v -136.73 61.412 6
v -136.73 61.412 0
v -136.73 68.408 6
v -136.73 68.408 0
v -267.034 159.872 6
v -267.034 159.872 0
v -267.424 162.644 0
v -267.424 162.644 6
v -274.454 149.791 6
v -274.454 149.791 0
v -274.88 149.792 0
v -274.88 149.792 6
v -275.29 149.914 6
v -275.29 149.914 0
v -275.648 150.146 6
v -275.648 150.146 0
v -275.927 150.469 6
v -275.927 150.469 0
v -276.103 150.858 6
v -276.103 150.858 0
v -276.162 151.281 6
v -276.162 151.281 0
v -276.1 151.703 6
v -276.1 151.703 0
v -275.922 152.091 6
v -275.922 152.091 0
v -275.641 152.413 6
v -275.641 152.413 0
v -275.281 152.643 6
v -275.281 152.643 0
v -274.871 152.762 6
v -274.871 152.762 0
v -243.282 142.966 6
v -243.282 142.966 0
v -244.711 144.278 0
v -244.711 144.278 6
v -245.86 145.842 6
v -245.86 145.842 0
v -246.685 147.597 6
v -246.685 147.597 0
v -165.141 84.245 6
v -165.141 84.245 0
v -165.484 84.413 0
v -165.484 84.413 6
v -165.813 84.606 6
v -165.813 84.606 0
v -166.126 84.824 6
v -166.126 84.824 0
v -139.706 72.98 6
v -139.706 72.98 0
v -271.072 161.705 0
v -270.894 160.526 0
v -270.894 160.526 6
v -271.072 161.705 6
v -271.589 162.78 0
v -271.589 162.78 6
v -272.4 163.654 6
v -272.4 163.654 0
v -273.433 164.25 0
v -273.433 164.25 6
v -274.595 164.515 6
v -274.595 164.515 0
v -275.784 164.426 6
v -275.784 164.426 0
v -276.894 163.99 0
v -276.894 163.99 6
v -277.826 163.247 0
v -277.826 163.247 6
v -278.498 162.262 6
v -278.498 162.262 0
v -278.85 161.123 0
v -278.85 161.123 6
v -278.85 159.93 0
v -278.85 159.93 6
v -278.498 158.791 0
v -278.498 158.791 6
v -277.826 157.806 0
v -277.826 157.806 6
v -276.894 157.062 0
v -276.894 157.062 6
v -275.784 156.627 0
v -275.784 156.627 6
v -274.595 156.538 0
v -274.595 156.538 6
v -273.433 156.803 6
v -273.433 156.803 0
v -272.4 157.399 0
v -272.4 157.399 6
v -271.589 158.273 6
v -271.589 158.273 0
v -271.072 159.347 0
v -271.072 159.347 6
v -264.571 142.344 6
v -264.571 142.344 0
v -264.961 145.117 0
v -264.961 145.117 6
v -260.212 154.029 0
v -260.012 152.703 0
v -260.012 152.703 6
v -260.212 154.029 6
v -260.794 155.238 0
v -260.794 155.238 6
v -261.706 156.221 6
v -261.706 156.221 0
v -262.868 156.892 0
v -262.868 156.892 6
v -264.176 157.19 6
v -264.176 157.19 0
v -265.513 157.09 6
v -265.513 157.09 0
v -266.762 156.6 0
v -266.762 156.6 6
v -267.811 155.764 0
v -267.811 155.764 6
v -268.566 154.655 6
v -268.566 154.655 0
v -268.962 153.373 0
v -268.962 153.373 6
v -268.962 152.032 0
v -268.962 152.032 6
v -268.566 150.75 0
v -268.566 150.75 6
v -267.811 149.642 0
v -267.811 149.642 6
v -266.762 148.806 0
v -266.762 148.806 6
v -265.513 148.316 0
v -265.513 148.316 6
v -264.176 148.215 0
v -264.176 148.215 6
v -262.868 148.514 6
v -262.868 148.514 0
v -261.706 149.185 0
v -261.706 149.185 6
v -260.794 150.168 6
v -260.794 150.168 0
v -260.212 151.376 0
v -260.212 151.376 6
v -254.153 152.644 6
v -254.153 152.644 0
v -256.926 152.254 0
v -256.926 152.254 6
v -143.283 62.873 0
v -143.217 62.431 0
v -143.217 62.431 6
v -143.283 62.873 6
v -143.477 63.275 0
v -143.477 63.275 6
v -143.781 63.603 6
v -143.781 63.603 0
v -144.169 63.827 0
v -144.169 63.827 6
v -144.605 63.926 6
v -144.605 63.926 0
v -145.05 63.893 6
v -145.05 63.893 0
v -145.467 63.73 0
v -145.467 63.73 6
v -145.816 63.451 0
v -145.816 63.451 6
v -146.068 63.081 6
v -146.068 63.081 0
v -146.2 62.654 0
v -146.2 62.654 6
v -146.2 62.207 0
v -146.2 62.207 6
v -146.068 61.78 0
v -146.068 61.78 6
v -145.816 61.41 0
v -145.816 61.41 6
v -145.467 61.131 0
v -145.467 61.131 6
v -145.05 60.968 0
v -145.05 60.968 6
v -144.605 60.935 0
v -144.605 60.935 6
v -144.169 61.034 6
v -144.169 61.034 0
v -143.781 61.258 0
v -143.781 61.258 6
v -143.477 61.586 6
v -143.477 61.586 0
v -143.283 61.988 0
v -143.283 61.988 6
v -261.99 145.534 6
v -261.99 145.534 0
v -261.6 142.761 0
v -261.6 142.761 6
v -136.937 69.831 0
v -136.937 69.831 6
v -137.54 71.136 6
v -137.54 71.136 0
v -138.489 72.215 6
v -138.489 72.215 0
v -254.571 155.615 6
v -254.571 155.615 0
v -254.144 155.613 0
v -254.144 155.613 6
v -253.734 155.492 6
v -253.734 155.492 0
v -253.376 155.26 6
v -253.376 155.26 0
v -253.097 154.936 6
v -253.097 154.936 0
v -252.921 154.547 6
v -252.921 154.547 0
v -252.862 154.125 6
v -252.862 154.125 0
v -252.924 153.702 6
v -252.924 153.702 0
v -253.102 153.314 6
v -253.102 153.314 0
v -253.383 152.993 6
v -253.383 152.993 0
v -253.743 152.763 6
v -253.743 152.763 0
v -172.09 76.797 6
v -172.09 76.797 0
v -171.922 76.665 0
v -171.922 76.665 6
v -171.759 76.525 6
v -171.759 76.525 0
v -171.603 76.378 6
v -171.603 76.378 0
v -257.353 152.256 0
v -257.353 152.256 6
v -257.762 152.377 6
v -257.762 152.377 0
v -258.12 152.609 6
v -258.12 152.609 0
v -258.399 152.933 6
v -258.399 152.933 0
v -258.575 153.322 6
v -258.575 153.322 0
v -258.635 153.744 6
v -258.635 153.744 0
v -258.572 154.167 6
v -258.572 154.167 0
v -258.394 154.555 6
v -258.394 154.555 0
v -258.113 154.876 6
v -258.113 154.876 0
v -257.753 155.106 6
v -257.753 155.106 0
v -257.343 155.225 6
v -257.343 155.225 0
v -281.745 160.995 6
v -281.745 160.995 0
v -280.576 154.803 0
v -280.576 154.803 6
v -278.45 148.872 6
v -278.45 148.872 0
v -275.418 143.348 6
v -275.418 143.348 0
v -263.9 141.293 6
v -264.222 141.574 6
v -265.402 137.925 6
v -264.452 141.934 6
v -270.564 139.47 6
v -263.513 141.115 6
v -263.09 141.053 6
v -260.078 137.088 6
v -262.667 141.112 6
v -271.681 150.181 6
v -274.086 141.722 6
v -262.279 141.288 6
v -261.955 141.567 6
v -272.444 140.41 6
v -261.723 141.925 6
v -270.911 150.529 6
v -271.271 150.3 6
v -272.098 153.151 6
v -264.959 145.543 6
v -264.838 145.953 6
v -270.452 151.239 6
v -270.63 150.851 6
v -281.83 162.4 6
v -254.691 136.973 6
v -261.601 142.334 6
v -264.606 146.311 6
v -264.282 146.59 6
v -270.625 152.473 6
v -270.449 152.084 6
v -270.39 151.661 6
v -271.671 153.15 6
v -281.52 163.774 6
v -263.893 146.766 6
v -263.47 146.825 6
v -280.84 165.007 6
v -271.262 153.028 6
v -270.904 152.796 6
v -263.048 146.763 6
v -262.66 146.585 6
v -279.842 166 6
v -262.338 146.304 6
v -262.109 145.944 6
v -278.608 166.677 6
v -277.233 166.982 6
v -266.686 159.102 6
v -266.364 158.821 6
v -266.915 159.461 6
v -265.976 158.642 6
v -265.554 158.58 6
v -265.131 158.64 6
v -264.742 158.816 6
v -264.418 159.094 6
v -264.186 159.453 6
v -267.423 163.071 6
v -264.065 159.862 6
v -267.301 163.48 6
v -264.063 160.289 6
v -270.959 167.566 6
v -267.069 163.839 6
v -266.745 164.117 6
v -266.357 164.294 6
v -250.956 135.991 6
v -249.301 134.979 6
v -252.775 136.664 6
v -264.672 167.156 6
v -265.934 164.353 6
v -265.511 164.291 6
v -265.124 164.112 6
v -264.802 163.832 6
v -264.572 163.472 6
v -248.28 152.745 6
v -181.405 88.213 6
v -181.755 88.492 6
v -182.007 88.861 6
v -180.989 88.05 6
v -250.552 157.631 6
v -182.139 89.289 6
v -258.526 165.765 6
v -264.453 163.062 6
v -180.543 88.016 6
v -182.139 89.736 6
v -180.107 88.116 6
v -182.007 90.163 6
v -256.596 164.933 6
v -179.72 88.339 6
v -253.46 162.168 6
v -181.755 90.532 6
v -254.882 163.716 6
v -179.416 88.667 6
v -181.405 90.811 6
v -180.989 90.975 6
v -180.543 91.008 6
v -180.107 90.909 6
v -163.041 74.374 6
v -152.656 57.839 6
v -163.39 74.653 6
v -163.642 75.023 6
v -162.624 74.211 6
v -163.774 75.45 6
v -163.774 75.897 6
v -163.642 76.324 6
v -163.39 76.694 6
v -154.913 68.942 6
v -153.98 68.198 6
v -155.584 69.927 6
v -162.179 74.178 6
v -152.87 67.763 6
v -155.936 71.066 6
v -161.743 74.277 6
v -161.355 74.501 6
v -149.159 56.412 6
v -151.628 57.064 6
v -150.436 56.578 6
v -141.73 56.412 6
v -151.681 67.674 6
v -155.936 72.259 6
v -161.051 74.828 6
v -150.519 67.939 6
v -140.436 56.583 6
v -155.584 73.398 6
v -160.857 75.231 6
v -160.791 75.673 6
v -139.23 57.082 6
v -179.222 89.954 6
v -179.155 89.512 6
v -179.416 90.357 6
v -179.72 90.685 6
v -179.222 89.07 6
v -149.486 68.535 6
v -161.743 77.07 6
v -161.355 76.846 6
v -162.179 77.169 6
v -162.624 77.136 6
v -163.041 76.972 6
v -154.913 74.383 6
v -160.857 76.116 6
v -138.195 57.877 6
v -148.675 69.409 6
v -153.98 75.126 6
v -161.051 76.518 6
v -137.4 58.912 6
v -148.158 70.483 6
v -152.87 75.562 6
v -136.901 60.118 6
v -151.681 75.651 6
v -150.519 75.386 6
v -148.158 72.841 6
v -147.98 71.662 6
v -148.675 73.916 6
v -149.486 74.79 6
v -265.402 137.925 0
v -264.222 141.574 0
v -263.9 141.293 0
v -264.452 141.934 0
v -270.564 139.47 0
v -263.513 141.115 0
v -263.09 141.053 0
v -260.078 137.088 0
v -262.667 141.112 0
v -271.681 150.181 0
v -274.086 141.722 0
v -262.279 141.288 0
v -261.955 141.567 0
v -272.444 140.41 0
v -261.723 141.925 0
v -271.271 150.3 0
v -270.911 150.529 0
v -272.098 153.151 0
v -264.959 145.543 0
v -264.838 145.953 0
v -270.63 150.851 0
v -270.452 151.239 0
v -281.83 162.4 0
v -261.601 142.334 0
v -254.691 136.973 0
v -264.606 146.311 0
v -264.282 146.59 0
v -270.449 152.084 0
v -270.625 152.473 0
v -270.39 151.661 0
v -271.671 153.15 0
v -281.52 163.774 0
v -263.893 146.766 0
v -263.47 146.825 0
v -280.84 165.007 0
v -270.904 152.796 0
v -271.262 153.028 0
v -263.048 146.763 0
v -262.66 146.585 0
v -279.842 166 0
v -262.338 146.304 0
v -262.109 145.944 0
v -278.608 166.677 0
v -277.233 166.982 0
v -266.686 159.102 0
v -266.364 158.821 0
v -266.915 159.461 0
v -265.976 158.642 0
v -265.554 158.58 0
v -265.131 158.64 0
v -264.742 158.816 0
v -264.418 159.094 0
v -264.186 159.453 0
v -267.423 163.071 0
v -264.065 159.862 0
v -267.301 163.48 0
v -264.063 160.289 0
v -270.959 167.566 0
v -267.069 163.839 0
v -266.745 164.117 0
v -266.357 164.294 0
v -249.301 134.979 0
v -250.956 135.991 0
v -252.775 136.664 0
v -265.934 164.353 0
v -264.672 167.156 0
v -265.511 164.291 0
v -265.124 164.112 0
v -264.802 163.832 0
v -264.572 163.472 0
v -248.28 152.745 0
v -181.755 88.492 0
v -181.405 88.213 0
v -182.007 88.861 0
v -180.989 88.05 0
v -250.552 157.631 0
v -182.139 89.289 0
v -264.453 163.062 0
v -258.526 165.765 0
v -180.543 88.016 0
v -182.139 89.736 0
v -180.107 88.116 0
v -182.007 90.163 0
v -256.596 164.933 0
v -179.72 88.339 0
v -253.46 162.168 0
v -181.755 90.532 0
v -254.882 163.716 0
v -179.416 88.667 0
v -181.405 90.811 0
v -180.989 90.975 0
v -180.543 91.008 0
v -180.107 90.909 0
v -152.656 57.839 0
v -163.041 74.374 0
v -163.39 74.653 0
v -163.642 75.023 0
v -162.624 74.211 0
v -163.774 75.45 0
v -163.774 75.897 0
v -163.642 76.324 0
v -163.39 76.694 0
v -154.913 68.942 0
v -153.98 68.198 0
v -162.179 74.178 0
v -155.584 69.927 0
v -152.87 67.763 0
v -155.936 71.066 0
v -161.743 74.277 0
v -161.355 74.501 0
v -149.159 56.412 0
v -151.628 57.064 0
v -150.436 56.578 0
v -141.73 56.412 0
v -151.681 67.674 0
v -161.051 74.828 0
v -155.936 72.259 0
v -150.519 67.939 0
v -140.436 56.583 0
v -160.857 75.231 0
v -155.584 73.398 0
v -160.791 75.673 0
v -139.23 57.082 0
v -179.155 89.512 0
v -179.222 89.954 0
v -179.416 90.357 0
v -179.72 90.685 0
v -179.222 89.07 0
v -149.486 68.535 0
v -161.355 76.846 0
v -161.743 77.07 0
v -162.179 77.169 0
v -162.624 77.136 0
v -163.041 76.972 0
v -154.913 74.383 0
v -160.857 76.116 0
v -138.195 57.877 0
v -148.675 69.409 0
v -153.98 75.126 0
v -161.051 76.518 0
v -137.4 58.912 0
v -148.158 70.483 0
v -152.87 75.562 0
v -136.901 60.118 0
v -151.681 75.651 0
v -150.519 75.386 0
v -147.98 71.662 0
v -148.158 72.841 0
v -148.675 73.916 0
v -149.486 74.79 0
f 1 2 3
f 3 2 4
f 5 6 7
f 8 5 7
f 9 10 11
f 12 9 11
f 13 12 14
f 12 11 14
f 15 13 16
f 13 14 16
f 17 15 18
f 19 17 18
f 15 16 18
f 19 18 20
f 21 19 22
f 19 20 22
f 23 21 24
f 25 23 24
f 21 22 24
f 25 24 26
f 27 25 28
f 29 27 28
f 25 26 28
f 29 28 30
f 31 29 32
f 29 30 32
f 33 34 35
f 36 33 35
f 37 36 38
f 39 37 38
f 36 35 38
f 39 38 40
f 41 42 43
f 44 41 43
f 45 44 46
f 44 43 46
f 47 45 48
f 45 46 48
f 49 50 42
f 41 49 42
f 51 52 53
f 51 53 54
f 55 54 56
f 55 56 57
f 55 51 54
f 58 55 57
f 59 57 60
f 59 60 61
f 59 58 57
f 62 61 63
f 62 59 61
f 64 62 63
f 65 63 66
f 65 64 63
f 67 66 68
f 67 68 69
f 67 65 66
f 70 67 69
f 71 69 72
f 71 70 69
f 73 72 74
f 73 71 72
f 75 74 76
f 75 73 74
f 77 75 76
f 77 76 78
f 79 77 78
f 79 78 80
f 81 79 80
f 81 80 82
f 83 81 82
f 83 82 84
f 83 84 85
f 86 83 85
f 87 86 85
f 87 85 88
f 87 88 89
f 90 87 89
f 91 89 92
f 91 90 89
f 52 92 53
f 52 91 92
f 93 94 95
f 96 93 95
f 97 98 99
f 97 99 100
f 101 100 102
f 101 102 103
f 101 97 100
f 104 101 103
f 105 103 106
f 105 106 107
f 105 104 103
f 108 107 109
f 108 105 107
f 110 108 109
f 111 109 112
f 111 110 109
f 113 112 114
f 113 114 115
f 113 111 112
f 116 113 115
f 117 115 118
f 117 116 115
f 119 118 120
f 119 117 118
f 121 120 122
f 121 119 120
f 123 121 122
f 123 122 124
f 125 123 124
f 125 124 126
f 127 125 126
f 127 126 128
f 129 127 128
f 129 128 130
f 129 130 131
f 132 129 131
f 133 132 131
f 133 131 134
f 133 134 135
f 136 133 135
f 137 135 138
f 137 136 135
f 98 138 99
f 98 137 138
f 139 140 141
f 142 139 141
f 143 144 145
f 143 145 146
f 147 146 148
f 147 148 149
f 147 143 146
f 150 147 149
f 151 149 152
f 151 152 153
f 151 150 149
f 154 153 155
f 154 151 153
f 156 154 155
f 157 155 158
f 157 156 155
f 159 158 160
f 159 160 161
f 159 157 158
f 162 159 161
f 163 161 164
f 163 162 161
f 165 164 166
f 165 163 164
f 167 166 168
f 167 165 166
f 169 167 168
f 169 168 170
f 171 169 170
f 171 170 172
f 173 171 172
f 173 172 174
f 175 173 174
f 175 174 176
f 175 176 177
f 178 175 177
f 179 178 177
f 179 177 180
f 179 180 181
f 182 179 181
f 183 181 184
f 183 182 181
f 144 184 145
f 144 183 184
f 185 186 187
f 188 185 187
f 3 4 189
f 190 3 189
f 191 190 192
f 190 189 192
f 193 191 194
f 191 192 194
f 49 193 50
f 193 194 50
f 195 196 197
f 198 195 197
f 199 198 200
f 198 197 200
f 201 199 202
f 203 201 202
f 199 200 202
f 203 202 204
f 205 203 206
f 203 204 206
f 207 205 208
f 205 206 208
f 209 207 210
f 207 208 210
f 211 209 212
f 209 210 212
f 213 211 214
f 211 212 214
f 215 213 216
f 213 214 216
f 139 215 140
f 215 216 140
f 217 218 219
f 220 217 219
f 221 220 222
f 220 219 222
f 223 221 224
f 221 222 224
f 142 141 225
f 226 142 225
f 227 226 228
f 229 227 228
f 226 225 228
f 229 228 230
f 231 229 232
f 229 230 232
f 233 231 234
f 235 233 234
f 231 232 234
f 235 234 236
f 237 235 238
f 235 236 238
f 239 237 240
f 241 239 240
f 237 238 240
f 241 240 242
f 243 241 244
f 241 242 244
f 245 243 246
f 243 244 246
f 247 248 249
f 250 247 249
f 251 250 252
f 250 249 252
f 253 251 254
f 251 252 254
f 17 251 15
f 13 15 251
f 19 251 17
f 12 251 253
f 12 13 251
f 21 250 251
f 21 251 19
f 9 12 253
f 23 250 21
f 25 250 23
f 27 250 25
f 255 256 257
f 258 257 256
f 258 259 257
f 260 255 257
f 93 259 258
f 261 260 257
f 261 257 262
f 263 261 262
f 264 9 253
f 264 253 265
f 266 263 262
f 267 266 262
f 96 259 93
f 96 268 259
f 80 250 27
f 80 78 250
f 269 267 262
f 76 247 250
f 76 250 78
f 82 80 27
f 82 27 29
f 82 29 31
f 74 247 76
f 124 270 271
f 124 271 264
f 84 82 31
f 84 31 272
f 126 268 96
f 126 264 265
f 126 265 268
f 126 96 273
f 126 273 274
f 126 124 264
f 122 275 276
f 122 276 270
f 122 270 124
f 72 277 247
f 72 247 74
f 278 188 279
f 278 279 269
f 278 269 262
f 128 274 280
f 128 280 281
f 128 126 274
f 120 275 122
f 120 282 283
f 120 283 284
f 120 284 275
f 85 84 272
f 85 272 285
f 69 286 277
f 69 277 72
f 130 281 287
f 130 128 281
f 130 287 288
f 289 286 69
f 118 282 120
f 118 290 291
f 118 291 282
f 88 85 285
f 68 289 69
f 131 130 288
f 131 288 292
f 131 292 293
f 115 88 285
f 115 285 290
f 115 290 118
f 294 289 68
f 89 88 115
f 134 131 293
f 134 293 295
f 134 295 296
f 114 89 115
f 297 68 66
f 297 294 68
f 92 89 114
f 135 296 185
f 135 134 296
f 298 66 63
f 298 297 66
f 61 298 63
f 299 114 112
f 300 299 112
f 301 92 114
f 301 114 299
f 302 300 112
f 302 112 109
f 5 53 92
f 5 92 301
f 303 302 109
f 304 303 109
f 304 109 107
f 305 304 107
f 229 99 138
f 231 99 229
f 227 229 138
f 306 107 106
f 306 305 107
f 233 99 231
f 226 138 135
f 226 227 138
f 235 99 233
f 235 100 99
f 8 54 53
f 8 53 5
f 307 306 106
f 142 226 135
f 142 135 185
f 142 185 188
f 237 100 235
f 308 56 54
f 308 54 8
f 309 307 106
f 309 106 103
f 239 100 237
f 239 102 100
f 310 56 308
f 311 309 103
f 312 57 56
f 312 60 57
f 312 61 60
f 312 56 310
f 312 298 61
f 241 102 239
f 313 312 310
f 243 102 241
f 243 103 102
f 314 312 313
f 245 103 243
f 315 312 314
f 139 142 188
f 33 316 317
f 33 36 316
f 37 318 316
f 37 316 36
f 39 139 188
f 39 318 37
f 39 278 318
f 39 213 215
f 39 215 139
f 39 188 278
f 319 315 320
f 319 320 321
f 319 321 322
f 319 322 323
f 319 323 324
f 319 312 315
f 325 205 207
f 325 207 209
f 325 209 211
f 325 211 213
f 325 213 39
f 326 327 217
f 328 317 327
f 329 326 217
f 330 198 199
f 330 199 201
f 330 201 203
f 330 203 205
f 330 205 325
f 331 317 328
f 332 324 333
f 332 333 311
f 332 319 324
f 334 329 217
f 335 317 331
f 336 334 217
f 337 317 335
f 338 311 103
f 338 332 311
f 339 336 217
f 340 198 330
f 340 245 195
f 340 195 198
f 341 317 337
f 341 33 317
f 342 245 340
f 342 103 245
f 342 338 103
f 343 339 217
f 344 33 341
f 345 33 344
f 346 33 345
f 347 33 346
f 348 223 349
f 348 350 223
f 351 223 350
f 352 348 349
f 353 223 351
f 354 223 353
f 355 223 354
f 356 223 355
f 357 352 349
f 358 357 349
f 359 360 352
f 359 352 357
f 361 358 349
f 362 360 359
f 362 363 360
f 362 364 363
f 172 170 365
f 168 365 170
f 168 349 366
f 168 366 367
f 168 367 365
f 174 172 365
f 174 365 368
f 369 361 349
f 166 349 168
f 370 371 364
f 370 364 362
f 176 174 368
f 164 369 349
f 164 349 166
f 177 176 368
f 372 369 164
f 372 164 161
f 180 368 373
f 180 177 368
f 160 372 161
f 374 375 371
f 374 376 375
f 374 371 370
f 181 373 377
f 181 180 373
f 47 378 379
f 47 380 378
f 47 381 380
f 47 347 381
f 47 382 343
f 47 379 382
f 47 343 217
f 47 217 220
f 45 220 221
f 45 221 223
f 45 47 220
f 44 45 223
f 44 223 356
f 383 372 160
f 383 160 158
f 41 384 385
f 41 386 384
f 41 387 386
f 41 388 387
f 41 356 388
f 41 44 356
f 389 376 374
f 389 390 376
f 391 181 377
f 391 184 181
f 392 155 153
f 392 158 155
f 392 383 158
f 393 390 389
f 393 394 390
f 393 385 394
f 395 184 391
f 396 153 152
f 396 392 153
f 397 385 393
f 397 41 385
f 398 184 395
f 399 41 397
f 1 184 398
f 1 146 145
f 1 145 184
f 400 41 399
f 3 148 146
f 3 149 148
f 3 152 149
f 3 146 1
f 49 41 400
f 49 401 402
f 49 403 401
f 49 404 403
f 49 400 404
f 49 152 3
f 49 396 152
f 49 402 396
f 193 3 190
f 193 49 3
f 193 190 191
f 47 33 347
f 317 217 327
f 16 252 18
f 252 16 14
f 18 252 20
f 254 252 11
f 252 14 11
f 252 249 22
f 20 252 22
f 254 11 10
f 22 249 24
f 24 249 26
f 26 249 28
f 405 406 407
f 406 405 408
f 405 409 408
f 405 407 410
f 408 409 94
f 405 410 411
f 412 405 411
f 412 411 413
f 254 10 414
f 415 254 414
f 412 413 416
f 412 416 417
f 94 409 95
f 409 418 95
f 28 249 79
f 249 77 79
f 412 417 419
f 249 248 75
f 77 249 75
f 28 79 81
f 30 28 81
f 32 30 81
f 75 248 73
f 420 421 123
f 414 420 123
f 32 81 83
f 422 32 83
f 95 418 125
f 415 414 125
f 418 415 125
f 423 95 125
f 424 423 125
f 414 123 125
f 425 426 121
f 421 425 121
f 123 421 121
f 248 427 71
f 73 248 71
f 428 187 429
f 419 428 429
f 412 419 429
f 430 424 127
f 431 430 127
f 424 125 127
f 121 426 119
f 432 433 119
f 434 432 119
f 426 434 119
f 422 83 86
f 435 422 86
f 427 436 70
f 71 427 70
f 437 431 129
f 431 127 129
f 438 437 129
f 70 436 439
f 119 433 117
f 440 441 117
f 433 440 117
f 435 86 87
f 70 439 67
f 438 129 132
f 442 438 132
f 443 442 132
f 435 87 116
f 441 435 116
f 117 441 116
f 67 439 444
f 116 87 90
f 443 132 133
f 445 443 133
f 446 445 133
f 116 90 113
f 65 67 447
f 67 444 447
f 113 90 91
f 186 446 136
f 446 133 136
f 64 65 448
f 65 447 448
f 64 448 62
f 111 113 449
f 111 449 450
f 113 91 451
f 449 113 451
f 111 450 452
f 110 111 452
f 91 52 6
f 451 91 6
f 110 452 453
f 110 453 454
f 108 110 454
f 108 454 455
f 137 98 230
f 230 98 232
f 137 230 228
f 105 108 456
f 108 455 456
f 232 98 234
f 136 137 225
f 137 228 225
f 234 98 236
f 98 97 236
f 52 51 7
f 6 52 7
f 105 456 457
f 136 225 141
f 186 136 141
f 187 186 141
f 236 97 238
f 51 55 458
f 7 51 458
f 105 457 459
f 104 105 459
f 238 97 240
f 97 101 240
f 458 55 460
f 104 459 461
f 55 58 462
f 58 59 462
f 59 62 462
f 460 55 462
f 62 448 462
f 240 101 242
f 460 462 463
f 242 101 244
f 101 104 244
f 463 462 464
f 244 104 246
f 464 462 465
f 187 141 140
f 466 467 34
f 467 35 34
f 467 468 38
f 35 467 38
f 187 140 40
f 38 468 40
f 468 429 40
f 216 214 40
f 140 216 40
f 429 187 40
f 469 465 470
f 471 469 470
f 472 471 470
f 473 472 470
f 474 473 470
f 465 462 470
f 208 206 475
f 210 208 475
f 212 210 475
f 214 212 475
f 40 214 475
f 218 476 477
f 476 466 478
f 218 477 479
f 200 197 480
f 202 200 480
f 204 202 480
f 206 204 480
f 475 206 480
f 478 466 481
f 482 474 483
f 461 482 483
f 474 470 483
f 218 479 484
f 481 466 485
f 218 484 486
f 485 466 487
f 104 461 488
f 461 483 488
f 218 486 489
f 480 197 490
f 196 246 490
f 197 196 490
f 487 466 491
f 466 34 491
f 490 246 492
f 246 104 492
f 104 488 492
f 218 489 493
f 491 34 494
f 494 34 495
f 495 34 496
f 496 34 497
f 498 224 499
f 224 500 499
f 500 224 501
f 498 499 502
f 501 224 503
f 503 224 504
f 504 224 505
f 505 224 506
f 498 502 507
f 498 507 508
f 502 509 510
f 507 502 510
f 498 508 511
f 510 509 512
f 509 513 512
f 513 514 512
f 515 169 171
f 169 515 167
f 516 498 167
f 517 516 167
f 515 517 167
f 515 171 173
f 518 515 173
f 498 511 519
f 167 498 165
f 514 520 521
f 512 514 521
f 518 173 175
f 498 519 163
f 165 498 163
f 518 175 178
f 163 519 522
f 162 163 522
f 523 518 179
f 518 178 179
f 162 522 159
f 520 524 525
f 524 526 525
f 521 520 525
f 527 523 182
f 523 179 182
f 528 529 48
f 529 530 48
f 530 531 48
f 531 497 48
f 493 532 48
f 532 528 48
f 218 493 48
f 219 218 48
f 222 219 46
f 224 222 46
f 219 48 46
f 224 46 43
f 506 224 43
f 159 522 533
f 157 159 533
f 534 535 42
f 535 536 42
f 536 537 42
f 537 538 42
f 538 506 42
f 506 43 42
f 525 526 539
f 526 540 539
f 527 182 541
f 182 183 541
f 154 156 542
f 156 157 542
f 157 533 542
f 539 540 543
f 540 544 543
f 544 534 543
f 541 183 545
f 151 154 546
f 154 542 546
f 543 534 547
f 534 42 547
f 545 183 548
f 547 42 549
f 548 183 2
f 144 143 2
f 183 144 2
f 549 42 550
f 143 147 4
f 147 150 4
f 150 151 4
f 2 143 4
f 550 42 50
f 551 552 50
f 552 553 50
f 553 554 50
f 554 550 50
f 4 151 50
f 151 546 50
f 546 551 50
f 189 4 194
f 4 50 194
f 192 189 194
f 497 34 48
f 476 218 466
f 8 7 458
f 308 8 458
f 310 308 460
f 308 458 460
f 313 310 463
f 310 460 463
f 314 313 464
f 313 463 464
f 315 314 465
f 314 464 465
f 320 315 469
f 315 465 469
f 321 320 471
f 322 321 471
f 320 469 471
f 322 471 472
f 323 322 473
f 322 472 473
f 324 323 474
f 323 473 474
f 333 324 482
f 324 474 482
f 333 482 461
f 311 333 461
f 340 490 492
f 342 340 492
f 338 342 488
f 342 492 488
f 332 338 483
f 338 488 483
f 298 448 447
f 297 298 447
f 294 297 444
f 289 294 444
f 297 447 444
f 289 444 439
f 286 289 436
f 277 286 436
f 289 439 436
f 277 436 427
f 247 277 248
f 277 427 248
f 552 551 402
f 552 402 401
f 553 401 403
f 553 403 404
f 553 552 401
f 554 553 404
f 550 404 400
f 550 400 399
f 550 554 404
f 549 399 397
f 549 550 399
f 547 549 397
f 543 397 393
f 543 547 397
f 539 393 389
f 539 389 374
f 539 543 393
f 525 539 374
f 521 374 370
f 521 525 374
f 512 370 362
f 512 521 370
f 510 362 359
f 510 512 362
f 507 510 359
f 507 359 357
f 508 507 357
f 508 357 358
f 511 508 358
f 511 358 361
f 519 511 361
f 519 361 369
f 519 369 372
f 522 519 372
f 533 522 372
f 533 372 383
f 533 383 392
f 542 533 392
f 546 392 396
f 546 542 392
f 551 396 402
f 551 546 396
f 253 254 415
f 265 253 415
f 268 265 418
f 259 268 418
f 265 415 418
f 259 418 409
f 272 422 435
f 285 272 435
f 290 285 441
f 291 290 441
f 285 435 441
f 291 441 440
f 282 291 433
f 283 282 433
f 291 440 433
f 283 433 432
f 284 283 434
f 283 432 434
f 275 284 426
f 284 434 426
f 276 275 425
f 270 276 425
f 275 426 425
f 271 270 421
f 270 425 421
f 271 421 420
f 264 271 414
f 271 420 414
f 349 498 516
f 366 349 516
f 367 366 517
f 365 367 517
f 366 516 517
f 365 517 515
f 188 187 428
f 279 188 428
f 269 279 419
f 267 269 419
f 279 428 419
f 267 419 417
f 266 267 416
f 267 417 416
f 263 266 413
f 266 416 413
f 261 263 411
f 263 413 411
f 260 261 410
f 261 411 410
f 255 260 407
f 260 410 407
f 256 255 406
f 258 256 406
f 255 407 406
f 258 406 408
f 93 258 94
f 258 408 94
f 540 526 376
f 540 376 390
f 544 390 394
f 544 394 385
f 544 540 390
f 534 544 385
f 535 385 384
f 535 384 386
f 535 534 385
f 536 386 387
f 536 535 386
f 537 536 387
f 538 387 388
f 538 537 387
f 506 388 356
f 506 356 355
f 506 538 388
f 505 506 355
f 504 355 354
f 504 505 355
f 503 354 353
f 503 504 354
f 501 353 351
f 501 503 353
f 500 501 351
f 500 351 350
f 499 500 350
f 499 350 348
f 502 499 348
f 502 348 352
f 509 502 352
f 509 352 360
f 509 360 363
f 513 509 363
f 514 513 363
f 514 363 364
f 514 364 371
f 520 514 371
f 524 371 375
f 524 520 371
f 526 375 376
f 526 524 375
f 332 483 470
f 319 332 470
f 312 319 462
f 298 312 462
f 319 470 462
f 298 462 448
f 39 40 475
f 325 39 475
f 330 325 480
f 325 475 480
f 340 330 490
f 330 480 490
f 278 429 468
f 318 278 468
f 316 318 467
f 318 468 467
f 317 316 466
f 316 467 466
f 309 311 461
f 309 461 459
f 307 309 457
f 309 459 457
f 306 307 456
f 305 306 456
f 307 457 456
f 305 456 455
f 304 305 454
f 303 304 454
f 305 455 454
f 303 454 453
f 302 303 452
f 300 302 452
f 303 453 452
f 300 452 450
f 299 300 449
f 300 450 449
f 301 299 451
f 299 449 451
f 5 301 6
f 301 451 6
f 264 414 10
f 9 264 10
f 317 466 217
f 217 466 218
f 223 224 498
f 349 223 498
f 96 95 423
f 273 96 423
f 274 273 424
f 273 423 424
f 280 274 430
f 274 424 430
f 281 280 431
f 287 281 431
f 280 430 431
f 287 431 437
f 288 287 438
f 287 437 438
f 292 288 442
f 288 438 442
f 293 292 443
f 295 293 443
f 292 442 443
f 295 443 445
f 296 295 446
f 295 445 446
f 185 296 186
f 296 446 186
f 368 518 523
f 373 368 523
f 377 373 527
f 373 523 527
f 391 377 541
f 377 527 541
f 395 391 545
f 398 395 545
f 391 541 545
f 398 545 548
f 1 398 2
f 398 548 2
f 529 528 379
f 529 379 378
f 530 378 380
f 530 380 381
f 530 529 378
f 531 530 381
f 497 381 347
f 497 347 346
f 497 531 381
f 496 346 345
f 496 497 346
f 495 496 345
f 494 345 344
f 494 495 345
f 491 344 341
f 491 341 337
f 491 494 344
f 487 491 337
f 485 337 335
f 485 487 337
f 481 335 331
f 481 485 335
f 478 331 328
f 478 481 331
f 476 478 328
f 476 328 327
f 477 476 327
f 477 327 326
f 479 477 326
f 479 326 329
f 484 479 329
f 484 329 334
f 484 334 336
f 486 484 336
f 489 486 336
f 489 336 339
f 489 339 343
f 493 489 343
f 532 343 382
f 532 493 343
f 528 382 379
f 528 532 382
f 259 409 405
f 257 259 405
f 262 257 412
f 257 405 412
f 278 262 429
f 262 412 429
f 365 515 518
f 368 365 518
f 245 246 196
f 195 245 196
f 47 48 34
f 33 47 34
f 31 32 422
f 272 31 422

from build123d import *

# Parameters (mm, degrees)
CROQUIS1_R              = 1.5
CROQUIS1_R_2            = 4
CROQUIS1_R_3            = 4.5
SALIENTE_EXTRUIR1_DEPTH = 6


with BuildPart() as part:
    # Croquis1 → Saliente-Extruir1 (new body)
    with BuildSketch(Plane.XY):
        with BuildLine():
            ThreePointArc((-141.730339063, 56.412363794), (-138.194805157, 57.876829888), (-136.730339063, 61.412363794))
            Line((-136.730339063, 61.412363794), (-136.730339063, 68.408394616))
            ThreePointArc((-136.730339063, 68.408394616), (-137.539641754, 71.135674591), (-139.705561488, 72.980076558))
            Line((-139.705561488, 72.980076558), (-165.141293909, 84.245449184))
            ThreePointArc((-165.141293909, 84.245449184), (-165.650008995, 84.506514587), (-166.12559145, 84.823953575))
            Line((-166.12559145, 84.823953575), (-243.282498112, 142.965853083))
            ThreePointArc((-243.282498112, 142.965853083), (-245.323514753, 145.031918552), (-246.684791002, 147.597323475))
            ThreePointArc((-246.684791002, 147.597323475), (-249.33333249, 155.226277836), (-253.46024382, 162.167770437))
            ThreePointArc((-253.46024382, 162.167770437), (-255.706791789, 164.36963499), (-258.526200935, 165.764668091))
            ThreePointArc((-258.526200935, 165.764668091), (-267.807267276, 167.484933762), (-277.233031605, 166.98246665))
            ThreePointArc((-277.233031605, 166.98246665), (-280.839635864, 165.006508056), (-281.744934312, 160.994969527))
            ThreePointArc((-281.744934312, 160.994969527), (-279.629843944, 151.795844616), (-275.418009863, 143.348480526))
            ThreePointArc((-275.418009863, 143.348480526), (-273.299883496, 141.022813744), (-270.564082899, 139.470209357))
            ThreePointArc((-270.564082899, 139.470209357), (-262.753961023, 137.416502238), (-254.690502443, 136.973385563))
            ThreePointArc((-254.690502443, 136.973385563), (-251.84925837, 136.371964278), (-249.300648344, 134.979497983))
            Line((-249.300648344, 134.979497983), (-172.090396499, 76.797399996))
            ThreePointArc((-172.090396499, 76.797399996), (-171.839715997, 76.595527407), (-171.602543042, 76.377944673))
            Line((-171.602543042, 76.377944673), (-152.656110988, 57.838641566))
            ThreePointArc((-152.656110988, 57.838641566), (-151.047487061, 56.782643978), (-149.159182416, 56.412363794))
            Line((-149.159182416, 56.412363794), (-141.730339063, 56.412363794))
        make_face()
        with Locations((-144.716694163, 62.430514025)):
            Circle(CROQUIS1_R, mode=Mode.SUBTRACT)
        with Locations((-162.290622468, 75.673418875)):
            Circle(CROQUIS1_R, mode=Mode.SUBTRACT)
        with Locations((-151.980339063, 71.662363794)):
            Circle(CROQUIS1_R_2, mode=Mode.SUBTRACT)
        with Locations((-180.655292115, 89.512190067)):
            Circle(CROQUIS1_R, mode=Mode.SUBTRACT)
        with BuildLine():
            Line((-271.680758131, 150.180525793), (-274.453508724, 149.79084111))
            ThreePointArc((-274.453508724, 149.79084111), (-276.147670478, 151.067483562), (-274.871028026, 152.761645316))
            Line((-274.871028026, 152.761645316), (-272.098277434, 153.151329999))
            ThreePointArc((-272.098277434, 153.151329999), (-270.404115679, 151.874687547), (-271.680758131, 150.180525793))
        make_face(mode=Mode.SUBTRACT)
        with Locations((-264.51202067, 152.702767498)):
            Circle(CROQUIS1_R_3, mode=Mode.SUBTRACT)
        with BuildLine():
            Line((-261.989778965, 145.534030037), (-261.600094282, 142.761279445))
            ThreePointArc((-261.600094282, 142.761279445), (-262.876736734, 141.06711769), (-264.570898489, 142.343760142))
            Line((-264.570898489, 142.343760142), (-264.960583171, 145.116510734))
            ThreePointArc((-264.960583171, 145.116510734), (-263.68394072, 146.810672489), (-261.989778965, 145.534030037))
        make_face(mode=Mode.SUBTRACT)
        with Locations((-274.894282301, 160.526362799)):
            Circle(CROQUIS1_R_2, mode=Mode.SUBTRACT)
        with BuildLine():
            Line((-267.034262376, 159.871504959), (-267.423947058, 162.644255551))
            ThreePointArc((-267.423947058, 162.644255551), (-266.147304607, 164.338417306), (-264.453142852, 163.061774854))
            Line((-264.453142852, 163.061774854), (-264.063458169, 160.289024262))
            ThreePointArc((-264.063458169, 160.289024262), (-265.340100621, 158.594862507), (-267.034262376, 159.871504959))
        make_face(mode=Mode.SUBTRACT)
        with BuildLine():
            Line((-257.34328321, 155.225009203), (-254.570532617, 155.614693886))
            ThreePointArc((-254.570532617, 155.614693886), (-252.876370863, 154.338051434), (-254.153013314, 152.64388968))
            Line((-254.153013314, 152.64388968), (-256.925763907, 152.254204997))
            ThreePointArc((-256.925763907, 152.254204997), (-258.619925661, 153.530847449), (-257.34328321, 155.225009203))
        make_face(mode=Mode.SUBTRACT)
    extrude(amount=SALIENTE_EXTRUIR1_DEPTH)


solid = part.part
